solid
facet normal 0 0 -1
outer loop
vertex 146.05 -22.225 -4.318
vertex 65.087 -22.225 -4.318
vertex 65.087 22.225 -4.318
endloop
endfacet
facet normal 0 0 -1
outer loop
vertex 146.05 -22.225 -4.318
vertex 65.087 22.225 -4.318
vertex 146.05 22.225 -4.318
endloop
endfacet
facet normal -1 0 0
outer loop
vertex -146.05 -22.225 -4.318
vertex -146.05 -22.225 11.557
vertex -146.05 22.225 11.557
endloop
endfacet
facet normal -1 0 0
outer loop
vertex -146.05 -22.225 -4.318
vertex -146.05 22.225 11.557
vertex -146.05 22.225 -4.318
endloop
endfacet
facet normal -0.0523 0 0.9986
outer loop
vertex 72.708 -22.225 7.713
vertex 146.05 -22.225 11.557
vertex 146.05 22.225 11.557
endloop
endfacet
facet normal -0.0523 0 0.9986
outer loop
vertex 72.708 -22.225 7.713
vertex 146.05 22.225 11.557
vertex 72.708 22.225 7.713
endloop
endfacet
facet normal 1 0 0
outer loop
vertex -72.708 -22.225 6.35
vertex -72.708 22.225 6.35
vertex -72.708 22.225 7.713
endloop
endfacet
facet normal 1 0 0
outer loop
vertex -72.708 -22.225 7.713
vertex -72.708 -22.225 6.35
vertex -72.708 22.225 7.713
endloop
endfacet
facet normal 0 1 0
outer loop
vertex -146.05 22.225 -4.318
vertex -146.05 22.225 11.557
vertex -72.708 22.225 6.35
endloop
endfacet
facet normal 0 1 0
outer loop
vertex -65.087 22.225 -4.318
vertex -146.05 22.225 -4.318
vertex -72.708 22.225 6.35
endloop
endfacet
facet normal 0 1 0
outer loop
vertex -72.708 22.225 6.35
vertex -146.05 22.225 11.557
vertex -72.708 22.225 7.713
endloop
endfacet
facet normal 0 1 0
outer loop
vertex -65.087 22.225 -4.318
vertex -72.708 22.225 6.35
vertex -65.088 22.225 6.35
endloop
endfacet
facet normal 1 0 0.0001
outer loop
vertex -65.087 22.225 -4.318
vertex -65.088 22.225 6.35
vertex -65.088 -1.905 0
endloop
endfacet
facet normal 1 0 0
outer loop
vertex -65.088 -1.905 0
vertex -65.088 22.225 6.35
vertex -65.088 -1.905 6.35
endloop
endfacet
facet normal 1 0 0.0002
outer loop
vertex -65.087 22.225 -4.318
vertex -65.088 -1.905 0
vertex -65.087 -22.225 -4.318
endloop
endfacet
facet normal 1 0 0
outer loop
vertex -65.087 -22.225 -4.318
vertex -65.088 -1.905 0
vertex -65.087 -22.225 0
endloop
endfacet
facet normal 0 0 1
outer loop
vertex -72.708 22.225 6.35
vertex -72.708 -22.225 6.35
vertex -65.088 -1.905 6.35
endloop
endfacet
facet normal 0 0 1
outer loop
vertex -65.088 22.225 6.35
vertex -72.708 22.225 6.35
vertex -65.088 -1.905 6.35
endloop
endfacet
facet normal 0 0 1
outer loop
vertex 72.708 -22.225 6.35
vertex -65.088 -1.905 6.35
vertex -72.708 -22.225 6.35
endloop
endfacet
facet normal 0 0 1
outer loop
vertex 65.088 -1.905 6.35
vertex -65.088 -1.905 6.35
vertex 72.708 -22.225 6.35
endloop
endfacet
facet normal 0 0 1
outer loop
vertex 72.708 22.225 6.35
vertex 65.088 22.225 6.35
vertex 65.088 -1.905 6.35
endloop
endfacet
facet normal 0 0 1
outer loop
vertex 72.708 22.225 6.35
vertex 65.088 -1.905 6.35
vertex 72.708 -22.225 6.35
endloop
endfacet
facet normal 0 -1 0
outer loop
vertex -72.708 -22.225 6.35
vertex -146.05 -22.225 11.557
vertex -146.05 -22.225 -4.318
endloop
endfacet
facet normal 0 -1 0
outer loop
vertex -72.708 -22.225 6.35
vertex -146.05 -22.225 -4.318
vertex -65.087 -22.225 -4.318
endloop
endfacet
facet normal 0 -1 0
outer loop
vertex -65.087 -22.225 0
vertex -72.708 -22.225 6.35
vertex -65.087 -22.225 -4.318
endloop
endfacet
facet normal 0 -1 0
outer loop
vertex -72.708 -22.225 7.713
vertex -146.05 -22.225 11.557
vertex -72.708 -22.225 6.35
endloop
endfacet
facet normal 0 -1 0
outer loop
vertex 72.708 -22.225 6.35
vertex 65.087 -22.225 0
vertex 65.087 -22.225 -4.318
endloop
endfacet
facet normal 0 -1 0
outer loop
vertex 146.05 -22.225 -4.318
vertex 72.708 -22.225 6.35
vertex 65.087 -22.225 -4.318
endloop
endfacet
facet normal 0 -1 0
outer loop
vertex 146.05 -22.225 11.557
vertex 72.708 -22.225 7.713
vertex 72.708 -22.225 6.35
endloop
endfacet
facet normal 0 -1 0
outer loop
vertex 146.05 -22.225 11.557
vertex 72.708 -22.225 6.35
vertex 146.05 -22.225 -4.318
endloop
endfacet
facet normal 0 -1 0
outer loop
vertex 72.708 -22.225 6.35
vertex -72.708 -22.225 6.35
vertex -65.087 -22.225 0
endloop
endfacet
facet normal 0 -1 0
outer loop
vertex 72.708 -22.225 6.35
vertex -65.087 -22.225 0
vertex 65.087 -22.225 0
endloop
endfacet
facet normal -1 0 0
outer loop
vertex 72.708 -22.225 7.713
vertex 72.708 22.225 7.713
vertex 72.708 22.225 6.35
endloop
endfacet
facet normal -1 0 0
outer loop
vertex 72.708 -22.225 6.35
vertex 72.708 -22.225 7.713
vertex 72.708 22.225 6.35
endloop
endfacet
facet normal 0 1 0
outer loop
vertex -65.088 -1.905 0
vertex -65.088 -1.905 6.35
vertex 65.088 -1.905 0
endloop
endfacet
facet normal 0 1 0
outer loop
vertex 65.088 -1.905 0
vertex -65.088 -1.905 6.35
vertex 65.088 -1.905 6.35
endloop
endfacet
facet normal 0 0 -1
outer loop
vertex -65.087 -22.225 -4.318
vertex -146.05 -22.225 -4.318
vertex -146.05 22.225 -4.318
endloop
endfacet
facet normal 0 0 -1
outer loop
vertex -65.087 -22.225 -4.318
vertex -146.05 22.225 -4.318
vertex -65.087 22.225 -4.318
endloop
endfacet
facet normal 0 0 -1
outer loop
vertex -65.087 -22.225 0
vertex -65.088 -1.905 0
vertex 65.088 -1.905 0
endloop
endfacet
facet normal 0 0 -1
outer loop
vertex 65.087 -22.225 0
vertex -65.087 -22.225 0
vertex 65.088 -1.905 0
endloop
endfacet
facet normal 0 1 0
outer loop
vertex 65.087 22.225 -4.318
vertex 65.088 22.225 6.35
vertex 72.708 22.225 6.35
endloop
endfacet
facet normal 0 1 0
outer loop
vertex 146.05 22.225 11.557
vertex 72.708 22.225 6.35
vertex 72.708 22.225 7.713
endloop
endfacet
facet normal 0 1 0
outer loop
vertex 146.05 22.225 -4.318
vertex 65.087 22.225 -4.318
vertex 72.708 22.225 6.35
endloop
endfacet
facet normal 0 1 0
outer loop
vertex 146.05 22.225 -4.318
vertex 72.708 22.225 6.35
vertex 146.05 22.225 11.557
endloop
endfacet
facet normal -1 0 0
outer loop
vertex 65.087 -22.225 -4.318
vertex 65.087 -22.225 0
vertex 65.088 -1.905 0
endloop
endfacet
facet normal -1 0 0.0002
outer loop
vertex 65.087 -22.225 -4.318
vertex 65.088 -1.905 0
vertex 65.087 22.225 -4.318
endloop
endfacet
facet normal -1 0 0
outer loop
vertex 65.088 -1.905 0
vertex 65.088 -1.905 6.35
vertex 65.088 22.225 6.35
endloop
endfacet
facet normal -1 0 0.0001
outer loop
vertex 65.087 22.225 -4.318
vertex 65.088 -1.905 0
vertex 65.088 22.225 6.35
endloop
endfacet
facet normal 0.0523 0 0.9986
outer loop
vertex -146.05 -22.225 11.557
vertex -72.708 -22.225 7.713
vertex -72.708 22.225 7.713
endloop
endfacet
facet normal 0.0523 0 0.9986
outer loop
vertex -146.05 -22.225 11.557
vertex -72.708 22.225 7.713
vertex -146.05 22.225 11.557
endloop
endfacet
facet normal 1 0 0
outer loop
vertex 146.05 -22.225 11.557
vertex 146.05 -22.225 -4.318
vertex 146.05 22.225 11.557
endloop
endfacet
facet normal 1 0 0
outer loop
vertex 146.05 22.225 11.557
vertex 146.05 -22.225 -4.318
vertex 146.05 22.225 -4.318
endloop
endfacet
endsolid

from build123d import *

# Parameters (mm, degrees)
F0_W     = 292.1
F0_H     = 44.45
F1_DEPTH = 6.35
F2_W     = 130.175
F2_H     = 24.13
F3_DEPTH = 6.351
F4_W     = 80.9625
F4_H     = 44.45
F5_DEPTH = 4.318
F7_DEPTH = 44.45


with BuildPart() as f1:
    # F0 (on Top) → F1 (new body)
    with BuildSketch(Plane.XY):
        Rectangle(F0_W, F0_H)
    extrude(amount=F1_DEPTH)

    # F2 (on face) → F3 (cut, through all)
    with BuildSketch(Plane.XY.offset(6.35)):
        with Locations((0, 10.16)):
            Rectangle(F2_W, F2_H)
    extrude(amount=-F3_DEPTH, mode=Mode.SUBTRACT)

    # F4 (on face) → F5 (join)
    with BuildSketch(Plane(origin=(0, 0, 0), x_dir=(1, 0, 0), z_dir=(0, 0, -1))):
        with Locations((-105.56875, 0)):
            Rectangle(F4_W, F4_H)
        with Locations((105.56875, 0)):
            Rectangle(F4_W, F4_H)
    extrude(amount=F5_DEPTH)

    # F6 (on face) → F7 (join, through all)
    with BuildSketch(Plane.XZ.offset(22.225)):
        Polygon((-146.05, 11.557), (-146.05, 6.35), (-72.7075, 6.35), (-72.7075, 7.713282), align=None)
        Polygon((72.7075, 7.713282), (72.7075, 6.35), (146.05, 6.35), (146.05, 11.557), align=None)
    extrude(amount=-F7_DEPTH)


solid = f1.part
